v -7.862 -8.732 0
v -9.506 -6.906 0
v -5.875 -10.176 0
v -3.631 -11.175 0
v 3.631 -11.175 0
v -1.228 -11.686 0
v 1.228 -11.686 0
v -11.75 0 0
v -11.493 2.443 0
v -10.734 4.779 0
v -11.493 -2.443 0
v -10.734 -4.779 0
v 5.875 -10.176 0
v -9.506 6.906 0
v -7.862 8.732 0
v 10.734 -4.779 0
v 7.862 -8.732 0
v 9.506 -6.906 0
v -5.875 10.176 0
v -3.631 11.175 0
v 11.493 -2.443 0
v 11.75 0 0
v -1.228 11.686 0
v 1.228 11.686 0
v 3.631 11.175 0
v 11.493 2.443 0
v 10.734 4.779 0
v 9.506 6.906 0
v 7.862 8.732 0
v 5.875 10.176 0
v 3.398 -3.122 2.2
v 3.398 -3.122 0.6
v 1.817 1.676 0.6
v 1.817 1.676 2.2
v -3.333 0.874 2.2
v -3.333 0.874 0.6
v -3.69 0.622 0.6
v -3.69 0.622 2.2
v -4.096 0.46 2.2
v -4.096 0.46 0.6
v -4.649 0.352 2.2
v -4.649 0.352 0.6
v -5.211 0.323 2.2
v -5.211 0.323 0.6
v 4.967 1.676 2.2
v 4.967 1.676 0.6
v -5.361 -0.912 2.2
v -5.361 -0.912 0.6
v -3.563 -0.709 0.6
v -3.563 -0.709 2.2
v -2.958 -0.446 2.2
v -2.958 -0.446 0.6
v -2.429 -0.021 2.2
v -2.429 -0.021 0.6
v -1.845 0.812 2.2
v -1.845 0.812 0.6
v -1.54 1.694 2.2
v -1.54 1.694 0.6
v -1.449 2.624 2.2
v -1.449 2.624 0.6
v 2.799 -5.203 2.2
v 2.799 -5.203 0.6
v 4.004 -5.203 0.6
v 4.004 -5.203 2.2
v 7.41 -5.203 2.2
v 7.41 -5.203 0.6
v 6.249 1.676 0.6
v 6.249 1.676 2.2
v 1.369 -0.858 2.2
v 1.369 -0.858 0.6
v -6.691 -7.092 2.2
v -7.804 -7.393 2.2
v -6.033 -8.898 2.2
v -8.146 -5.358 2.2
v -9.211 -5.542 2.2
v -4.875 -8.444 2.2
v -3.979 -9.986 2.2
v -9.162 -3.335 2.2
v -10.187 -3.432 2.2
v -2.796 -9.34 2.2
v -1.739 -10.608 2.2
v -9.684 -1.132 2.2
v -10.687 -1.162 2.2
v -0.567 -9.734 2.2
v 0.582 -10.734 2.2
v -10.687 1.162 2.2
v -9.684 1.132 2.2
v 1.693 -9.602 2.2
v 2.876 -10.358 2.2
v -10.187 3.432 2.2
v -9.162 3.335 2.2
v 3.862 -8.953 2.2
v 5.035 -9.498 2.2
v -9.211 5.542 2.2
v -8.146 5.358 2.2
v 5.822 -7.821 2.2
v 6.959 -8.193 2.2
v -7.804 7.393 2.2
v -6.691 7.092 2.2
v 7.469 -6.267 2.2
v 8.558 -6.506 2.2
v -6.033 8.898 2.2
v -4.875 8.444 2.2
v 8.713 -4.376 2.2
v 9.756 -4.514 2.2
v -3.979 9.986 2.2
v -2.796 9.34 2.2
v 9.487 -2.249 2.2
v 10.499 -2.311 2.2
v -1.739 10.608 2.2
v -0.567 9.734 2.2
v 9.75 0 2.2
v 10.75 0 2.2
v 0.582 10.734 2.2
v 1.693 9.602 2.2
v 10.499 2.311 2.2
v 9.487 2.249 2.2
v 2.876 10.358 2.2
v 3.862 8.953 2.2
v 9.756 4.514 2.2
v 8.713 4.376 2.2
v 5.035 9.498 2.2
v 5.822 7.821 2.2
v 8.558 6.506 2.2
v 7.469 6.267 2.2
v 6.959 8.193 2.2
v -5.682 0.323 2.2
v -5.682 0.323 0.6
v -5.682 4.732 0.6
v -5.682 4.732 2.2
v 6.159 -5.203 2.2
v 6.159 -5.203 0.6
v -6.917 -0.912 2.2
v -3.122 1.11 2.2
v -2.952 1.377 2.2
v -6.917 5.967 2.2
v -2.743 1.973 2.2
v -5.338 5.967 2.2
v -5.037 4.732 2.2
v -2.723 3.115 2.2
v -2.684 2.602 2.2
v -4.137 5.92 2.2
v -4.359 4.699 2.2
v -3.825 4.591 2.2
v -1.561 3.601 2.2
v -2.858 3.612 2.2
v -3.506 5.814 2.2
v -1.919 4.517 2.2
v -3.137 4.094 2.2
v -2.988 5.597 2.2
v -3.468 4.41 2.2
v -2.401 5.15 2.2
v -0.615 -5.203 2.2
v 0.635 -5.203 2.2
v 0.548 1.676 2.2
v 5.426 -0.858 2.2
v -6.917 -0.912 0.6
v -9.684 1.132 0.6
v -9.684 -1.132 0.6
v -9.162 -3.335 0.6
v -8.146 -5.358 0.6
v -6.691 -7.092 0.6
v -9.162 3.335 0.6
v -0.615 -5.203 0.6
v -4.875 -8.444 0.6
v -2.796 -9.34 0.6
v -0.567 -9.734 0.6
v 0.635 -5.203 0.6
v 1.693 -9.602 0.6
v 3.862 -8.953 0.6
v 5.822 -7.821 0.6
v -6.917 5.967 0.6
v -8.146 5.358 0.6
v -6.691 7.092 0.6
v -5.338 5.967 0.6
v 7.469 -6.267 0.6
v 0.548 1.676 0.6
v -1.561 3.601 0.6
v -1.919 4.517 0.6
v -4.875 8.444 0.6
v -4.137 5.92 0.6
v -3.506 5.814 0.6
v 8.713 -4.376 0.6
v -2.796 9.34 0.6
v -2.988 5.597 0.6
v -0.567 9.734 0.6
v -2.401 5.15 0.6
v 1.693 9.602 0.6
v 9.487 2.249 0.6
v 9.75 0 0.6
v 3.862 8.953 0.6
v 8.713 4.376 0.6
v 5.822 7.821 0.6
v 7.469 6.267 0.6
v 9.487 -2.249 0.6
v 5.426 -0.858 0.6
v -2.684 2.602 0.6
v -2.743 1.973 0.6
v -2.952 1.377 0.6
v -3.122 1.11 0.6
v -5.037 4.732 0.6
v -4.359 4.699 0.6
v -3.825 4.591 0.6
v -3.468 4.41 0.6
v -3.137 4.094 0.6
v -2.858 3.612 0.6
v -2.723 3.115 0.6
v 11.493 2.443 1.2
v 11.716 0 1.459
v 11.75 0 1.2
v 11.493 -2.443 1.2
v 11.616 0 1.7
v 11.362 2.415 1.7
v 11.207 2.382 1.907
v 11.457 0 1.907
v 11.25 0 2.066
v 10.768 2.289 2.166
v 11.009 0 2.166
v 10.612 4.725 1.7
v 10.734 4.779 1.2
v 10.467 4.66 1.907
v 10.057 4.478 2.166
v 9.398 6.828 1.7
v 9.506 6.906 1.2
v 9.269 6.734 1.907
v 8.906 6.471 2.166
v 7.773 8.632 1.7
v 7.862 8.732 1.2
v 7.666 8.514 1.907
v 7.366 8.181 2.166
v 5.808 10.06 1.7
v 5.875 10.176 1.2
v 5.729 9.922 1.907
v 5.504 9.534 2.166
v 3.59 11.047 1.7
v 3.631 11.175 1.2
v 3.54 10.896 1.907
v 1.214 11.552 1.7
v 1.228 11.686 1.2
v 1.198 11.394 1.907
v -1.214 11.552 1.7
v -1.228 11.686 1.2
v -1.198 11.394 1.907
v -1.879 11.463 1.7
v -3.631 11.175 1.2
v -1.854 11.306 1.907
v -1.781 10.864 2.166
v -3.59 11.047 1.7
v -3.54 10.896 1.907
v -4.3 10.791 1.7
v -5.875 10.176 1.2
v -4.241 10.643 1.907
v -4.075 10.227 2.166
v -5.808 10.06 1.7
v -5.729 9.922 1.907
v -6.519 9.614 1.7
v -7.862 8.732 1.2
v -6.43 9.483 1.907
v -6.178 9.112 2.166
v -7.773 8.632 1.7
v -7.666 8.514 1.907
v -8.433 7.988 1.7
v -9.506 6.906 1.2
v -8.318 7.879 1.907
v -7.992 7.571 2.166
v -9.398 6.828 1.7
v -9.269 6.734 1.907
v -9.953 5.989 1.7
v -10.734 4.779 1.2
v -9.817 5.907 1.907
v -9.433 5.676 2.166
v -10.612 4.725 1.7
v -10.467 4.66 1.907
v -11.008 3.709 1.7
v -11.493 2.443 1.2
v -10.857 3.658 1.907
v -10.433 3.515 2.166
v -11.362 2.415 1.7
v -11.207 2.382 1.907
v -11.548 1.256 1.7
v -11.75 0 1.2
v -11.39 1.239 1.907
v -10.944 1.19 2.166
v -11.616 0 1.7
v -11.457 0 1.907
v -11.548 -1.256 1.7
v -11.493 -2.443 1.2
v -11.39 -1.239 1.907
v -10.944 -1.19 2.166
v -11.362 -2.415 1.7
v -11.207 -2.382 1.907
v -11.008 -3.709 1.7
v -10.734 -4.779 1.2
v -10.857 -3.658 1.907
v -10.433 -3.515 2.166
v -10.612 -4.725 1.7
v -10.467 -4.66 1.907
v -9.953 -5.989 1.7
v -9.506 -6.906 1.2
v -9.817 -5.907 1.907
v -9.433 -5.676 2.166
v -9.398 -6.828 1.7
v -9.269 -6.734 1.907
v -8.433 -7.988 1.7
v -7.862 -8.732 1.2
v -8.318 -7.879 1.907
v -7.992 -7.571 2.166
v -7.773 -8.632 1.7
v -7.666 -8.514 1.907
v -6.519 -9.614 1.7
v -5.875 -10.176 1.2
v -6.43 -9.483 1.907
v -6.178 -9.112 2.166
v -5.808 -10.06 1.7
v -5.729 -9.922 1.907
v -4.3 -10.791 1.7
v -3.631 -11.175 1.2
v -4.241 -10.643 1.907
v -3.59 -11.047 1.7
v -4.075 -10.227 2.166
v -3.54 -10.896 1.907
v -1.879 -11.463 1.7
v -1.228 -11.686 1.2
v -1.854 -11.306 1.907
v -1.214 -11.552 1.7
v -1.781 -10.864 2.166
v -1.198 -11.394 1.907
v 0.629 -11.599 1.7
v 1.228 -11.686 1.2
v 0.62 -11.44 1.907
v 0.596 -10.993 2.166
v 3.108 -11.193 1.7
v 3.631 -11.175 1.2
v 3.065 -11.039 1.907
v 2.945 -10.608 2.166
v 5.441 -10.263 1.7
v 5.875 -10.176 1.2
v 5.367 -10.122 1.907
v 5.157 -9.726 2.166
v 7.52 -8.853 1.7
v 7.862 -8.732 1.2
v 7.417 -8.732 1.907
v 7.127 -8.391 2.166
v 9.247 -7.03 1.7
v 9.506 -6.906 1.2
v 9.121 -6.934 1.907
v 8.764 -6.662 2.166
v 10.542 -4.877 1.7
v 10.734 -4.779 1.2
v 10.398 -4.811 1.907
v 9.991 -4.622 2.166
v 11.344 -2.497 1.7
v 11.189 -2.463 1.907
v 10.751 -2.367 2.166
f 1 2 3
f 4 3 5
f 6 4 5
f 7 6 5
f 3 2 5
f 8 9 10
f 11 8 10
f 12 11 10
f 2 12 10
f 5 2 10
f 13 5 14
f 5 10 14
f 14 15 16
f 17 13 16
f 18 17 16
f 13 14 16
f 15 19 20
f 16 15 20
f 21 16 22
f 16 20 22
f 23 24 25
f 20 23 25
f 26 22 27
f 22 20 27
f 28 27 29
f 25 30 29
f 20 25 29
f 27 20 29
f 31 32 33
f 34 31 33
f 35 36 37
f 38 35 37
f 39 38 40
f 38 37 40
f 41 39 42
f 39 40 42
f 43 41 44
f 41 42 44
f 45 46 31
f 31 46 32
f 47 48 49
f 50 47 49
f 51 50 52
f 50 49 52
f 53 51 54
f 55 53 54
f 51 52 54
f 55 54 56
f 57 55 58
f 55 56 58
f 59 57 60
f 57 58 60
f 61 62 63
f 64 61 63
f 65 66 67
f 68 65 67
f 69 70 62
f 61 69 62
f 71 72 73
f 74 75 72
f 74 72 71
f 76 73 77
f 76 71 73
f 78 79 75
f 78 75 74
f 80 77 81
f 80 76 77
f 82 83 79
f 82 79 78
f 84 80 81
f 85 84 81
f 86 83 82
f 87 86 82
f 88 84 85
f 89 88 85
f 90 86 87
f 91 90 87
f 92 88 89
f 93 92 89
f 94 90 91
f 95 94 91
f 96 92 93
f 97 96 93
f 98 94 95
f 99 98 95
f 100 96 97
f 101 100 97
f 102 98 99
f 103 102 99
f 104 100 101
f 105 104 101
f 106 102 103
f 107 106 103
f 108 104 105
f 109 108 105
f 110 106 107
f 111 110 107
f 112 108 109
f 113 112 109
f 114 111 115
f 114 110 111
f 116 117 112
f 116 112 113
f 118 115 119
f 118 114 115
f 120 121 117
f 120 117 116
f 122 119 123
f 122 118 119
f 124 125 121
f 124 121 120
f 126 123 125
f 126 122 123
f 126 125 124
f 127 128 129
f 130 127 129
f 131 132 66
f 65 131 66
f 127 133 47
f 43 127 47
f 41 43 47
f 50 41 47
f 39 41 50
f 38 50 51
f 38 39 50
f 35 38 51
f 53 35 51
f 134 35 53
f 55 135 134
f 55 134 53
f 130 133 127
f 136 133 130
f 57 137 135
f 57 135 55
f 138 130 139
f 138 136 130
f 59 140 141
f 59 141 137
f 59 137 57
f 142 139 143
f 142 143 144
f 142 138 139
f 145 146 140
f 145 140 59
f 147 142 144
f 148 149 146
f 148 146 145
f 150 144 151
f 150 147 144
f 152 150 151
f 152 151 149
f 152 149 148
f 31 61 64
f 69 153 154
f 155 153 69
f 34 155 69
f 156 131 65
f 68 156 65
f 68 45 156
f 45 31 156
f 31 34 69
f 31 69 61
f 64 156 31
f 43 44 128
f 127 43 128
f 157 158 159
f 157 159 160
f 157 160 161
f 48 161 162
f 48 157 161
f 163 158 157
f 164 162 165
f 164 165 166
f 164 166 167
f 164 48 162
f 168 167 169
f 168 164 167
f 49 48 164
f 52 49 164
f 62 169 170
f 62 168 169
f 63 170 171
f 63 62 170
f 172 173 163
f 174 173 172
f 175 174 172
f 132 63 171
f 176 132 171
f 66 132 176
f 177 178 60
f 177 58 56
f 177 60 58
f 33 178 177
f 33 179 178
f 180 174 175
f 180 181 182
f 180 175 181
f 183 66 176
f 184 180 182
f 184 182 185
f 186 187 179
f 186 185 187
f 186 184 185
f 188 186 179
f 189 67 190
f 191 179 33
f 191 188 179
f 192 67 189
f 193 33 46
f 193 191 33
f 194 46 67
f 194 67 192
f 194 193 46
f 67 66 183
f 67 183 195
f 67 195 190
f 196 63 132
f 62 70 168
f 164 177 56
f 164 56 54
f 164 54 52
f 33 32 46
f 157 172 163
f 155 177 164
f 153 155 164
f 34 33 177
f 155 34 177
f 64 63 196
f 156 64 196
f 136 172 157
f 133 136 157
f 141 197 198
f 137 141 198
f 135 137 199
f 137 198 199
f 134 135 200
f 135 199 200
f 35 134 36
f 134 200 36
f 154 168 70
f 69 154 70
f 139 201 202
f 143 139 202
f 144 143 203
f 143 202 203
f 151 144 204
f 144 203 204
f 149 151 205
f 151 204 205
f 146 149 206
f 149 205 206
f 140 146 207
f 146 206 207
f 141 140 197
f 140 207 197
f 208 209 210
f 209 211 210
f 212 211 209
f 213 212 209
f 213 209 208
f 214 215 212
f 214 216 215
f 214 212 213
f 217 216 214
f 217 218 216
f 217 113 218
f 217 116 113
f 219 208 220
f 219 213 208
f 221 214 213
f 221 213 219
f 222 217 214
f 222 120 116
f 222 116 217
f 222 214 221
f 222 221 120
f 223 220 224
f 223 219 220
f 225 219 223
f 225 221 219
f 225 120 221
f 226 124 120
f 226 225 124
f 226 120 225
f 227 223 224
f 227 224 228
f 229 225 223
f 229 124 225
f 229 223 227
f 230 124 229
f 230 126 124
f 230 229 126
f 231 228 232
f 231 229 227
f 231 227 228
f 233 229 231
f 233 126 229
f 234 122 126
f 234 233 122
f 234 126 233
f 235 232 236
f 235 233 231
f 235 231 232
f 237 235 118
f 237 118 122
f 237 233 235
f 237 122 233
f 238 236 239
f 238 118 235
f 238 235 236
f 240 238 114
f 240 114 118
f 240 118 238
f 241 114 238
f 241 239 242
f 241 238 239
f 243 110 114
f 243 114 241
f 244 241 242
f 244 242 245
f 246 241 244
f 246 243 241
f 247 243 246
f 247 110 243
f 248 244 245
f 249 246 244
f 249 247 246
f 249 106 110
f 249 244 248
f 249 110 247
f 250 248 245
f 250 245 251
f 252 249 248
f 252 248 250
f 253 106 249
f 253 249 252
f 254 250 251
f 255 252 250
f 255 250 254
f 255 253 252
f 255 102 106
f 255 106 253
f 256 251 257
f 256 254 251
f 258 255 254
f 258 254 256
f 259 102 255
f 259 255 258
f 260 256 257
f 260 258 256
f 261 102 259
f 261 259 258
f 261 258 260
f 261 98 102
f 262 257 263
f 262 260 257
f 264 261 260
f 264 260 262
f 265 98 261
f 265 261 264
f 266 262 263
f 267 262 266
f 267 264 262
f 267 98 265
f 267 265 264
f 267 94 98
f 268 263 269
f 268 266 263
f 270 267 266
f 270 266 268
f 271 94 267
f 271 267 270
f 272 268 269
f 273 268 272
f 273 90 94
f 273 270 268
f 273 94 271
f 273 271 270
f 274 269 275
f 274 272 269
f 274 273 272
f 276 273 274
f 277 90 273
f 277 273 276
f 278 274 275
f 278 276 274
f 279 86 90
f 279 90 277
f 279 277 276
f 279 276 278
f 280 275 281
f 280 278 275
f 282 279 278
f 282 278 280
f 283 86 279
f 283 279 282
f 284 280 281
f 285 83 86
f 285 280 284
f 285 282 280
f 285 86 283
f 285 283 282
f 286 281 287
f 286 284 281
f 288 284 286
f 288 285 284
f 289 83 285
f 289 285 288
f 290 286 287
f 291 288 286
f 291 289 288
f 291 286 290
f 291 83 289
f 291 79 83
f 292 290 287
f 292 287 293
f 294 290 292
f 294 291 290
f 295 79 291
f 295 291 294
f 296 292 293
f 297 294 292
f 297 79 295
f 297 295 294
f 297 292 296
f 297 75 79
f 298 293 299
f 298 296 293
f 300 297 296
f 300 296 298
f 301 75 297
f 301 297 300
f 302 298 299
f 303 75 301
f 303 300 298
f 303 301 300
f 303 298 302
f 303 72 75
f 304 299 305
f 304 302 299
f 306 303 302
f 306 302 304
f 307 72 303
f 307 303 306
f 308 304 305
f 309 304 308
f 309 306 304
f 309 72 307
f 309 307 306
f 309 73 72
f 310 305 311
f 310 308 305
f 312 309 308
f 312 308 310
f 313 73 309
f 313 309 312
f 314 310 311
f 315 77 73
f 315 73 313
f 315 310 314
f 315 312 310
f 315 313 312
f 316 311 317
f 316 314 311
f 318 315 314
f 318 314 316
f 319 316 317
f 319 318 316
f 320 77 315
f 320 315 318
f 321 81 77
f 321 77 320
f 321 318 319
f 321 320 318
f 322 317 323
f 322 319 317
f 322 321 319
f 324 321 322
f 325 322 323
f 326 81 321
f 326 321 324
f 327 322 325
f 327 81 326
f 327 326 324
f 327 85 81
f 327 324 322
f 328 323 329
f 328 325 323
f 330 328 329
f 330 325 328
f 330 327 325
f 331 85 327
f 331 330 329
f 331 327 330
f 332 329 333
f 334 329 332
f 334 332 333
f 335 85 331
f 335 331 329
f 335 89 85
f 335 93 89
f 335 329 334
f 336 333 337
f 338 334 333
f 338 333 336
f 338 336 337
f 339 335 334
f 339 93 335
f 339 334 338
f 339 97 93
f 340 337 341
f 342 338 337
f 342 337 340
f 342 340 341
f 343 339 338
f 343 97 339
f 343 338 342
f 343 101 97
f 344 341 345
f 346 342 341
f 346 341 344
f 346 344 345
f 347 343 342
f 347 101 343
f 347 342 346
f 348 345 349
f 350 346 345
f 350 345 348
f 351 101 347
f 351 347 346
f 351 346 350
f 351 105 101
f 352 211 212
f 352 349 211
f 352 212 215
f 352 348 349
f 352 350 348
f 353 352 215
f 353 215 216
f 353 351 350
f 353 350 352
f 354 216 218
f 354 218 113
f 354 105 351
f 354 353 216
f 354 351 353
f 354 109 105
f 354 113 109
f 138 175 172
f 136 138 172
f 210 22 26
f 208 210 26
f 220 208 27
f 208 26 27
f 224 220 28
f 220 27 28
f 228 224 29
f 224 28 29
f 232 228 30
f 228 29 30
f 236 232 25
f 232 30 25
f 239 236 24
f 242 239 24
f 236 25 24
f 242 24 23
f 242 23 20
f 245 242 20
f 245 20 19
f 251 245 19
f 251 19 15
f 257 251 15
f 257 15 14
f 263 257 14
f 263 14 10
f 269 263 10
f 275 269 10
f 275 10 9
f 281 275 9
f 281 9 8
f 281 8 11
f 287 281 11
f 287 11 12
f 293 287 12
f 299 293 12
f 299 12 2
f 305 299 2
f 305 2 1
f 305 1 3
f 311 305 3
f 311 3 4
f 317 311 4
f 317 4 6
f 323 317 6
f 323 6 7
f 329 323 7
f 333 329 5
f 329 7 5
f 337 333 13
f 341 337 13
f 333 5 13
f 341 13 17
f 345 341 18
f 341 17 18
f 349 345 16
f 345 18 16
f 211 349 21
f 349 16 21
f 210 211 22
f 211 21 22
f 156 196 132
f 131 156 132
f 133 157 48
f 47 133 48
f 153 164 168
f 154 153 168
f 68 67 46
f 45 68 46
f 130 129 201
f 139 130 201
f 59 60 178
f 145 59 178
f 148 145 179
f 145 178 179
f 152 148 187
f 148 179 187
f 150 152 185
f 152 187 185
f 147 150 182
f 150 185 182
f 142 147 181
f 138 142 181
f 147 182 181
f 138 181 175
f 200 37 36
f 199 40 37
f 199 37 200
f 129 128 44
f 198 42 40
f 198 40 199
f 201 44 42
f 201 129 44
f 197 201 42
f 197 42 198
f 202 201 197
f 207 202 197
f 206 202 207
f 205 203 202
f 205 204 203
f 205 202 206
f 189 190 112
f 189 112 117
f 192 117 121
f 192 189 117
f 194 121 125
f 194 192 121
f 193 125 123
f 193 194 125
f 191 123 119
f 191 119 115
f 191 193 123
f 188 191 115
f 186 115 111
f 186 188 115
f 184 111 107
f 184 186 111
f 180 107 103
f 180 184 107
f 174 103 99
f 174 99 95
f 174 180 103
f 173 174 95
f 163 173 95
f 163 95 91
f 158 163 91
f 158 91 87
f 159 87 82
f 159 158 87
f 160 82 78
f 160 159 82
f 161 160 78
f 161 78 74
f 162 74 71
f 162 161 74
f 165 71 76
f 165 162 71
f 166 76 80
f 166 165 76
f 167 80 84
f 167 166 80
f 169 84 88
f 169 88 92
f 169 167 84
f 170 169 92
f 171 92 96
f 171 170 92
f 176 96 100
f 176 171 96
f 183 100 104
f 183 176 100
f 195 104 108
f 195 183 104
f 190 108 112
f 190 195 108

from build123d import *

# Parameters (mm, degrees)
SKETCH1_R           = 11.75
BOSS_EXTRUDE1_DEPTH = 0.6
SKETCH2_R           = 11.75
SKETCH2_R_2         = 9.75
BOSS_EXTRUDE2_DEPTH = 1.6
BOSS_EXTRUDE3_DEPTH = 1.6
FILLET1_R           = 1


with BuildPart() as part:
    # Sketch1 → Boss-Extrude1 (new body)
    with BuildSketch(Plane.XY):
        Circle(SKETCH1_R)
    extrude(amount=BOSS_EXTRUDE1_DEPTH)

    # Sketch2 → Boss-Extrude2 (add)
    with BuildSketch(Plane.XY.offset(0.6)):
        Circle(SKETCH2_R)
        Circle(SKETCH2_R_2, mode=Mode.SUBTRACT)
    extrude(amount=BOSS_EXTRUDE2_DEPTH)

    # Sketch3 → Boss-Extrude3 (add)
    with BuildSketch(Plane.XY.offset(0.6)):
        with BuildLine():
            Line((-6.916956338, -0.911963991), (-5.361151216, -0.911963991))
            add(Edge.make_bspline(
                [(-5.361151216, -0.911963991), (-5.239855358, -0.911135682), (-5.005389093, -0.909534551), (-4.665741882, -0.890804083), (-4.349677023, -0.863299234), (-4.057909505, -0.821204302), (-3.789388655, -0.772346551), (-3.546096572, -0.706915643), (-3.326053246, -0.631828045), (-3.126949332, -0.544340632), (-2.945683277, -0.44173815), (-2.7747857, -0.326468517), (-2.612283679, -0.196802417), (-2.45727666, -0.052438003), (-2.309386888, 0.10566485), (-2.172085953, 0.280689674), (-2.040972084, 0.468103096), (-1.918172617, 0.668555578), (-1.808865755, 0.881651378), (-1.711570392, 1.104036522), (-1.630505782, 1.335855545), (-1.564500099, 1.576788364), (-1.511922924, 1.826137054), (-1.475126432, 2.084376718), (-1.452380824, 2.351276025), (-1.4500733, 2.532166496), (-1.448900782, 2.624082016)],
                knots=[0, 0, 0, 0, 0.000363844, 0.000703314, 0.001020209, 0.001315264, 0.001587422, 0.001838456, 0.002070302, 0.002284378, 0.002489835, 0.002694315, 0.002902211, 0.00311283, 0.003329292, 0.003550963, 0.003779572, 0.004015201, 0.004255569, 0.004497496, 0.004742868, 0.004991603, 0.005246465, 0.005506831, 0.005773705, 0.006049398, 0.006049398, 0.006049398, 0.006049398], degree=3))
            add(Edge.make_bspline(
                [(-1.448900782, 2.624082016), (-1.451970756, 2.753780967), (-1.458014179, 3.009100945), (-1.508926104, 3.383777758), (-1.591254497, 3.742951732), (-1.707062559, 4.083771806), (-1.850470901, 4.403352066), (-2.022220096, 4.695290765), (-2.217376545, 4.960182986), (-2.437672033, 5.19363362), (-2.675821661, 5.395516124), (-2.924276522, 5.566399637), (-3.182814338, 5.703564799), (-3.41110213, 5.789220823), (-3.609613669, 5.843055986), (-3.783646836, 5.874330612), (-3.981711628, 5.903336547), (-4.204554541, 5.928267914), (-4.452836402, 5.945340974), (-4.725788377, 5.957131127), (-5.023476578, 5.965891962), (-5.23023053, 5.966754323), (-5.337724567, 5.967202676)],
                knots=[0, 0, 0, 0, 0.000388958, 0.000765687, 0.001132051, 0.001492876, 0.0018438, 0.002181059, 0.002507107, 0.002828814, 0.003141656, 0.003442084, 0.0037318, 0.004017439, 0.00417154, 0.004348294, 0.004547467, 0.004772083, 0.005020776, 0.005293909, 0.005591681, 0.005914153, 0.005914153, 0.005914153, 0.005914153], degree=3))
            Line((-5.337724567, 5.967202676), (-6.916956338, 5.967202676))
            Line((-6.916956338, 5.967202676), (-6.916956338, -0.911963991))
        make_face()
        with BuildLine():
            Line((-5.682234116, 0.322758231), (-5.682234116, 4.732480453))
            Line((-5.682234116, 4.732480453), (-5.037312241, 4.732480453))
            add(Edge.make_bspline(
                [(-5.037312241, 4.732480453), (-4.960589746, 4.732108932), (-4.813049194, 4.73139448), (-4.599773783, 4.721578003), (-4.402949586, 4.705637209), (-4.222318791, 4.682058374), (-4.05746614, 4.653687), (-3.90899297, 4.61859535), (-3.776606644, 4.575921232), (-3.659215448, 4.525629351), (-3.552039877, 4.468210013), (-3.452750381, 4.401161931), (-3.356923903, 4.32665025), (-3.266331588, 4.24255096), (-3.180635874, 4.149959395), (-3.100343516, 4.048403256), (-3.024378224, 3.938192199), (-2.954709427, 3.818739134), (-2.890985622, 3.691323934), (-2.834687293, 3.557108901), (-2.787161197, 3.415362356), (-2.751069756, 3.266147042), (-2.720324605, 3.110388904), (-2.698124248, 2.947086468), (-2.686029416, 2.77677325), (-2.684432963, 2.66084794), (-2.683623005, 2.602033405)],
                knots=[0, 0, 0, 0, 0.000230149, 0.000442586, 0.000640338, 0.000822375, 0.000988895, 0.001141975, 0.001279683, 0.00140562, 0.001524619, 0.001643866, 0.001764607, 0.001888454, 0.002014249, 0.002142732, 0.002276515, 0.002415486, 0.002557229, 0.00270362, 0.002851783, 0.003005191, 0.003163833, 0.00332793, 0.003499256, 0.003675693, 0.003675693, 0.003675693, 0.003675693], degree=3))
            add(Edge.make_bspline(
                [(-2.683623005, 2.602033405), (-2.685262463, 2.511908699), (-2.688459279, 2.336172506), (-2.719481404, 2.080243078), (-2.769467097, 1.839548826), (-2.842282437, 1.614708069), (-2.931826264, 1.404291395), (-3.045683112, 1.211010286), (-3.176936165, 1.031696657), (-3.280787507, 0.926524812), (-3.332678994, 0.873973509)],
                knots=[0, 0, 0, 0, 0.000270268, 0.000527001, 0.000772141, 0.001006602, 0.001234957, 0.001456654, 0.001678245, 0.001899543, 0.001899543, 0.001899543, 0.001899543], degree=3))
            add(Edge.make_bspline(
                [(-3.332678994, 0.873973509), (-3.383844652, 0.829191175), (-3.488344714, 0.737728328), (-3.671812484, 0.628132448), (-3.873984463, 0.531841725), (-4.099485742, 0.455493921), (-4.346136951, 0.395114822), (-4.615407148, 0.353472834), (-4.905854335, 0.326714134), (-5.107069378, 0.324105116), (-5.210945053, 0.322758231)],
                knots=[0, 0, 0, 0, 0.000203614, 0.000415859, 0.00063839, 0.000874594, 0.001128605, 0.001399336, 0.001691279, 0.002002825, 0.002002825, 0.002002825, 0.002002825], degree=3))
            Line((-5.210945053, 0.322758231), (-5.682234116, 0.322758231))
        make_face(mode=Mode.SUBTRACT)
        Polygon((6.248715571, 1.676089617), (4.96714005, 1.676089617), (3.397554546, -3.122239376), (1.816944737, 1.676089617), (0.54777156, 1.676089617), (-0.615292676, -5.20307705), (0.634587966, -5.20307705), (1.369082324, -0.858122623), (2.79948597, -5.20307705), (4.003891352, -5.20307705), (5.426026769, -0.858122623), (6.159143088, -5.20307705), (7.410401769, -5.20307705), align=None)
    extrude(amount=BOSS_EXTRUDE3_DEPTH)

    # Fillet1
    fillet1_edges = [part.edges().sort_by_distance(p)[0] for p in [
        (-11.75, 0, 2.2),
    ]]
    fillet(fillet1_edges, radius=FILLET1_R)


solid = part.part
